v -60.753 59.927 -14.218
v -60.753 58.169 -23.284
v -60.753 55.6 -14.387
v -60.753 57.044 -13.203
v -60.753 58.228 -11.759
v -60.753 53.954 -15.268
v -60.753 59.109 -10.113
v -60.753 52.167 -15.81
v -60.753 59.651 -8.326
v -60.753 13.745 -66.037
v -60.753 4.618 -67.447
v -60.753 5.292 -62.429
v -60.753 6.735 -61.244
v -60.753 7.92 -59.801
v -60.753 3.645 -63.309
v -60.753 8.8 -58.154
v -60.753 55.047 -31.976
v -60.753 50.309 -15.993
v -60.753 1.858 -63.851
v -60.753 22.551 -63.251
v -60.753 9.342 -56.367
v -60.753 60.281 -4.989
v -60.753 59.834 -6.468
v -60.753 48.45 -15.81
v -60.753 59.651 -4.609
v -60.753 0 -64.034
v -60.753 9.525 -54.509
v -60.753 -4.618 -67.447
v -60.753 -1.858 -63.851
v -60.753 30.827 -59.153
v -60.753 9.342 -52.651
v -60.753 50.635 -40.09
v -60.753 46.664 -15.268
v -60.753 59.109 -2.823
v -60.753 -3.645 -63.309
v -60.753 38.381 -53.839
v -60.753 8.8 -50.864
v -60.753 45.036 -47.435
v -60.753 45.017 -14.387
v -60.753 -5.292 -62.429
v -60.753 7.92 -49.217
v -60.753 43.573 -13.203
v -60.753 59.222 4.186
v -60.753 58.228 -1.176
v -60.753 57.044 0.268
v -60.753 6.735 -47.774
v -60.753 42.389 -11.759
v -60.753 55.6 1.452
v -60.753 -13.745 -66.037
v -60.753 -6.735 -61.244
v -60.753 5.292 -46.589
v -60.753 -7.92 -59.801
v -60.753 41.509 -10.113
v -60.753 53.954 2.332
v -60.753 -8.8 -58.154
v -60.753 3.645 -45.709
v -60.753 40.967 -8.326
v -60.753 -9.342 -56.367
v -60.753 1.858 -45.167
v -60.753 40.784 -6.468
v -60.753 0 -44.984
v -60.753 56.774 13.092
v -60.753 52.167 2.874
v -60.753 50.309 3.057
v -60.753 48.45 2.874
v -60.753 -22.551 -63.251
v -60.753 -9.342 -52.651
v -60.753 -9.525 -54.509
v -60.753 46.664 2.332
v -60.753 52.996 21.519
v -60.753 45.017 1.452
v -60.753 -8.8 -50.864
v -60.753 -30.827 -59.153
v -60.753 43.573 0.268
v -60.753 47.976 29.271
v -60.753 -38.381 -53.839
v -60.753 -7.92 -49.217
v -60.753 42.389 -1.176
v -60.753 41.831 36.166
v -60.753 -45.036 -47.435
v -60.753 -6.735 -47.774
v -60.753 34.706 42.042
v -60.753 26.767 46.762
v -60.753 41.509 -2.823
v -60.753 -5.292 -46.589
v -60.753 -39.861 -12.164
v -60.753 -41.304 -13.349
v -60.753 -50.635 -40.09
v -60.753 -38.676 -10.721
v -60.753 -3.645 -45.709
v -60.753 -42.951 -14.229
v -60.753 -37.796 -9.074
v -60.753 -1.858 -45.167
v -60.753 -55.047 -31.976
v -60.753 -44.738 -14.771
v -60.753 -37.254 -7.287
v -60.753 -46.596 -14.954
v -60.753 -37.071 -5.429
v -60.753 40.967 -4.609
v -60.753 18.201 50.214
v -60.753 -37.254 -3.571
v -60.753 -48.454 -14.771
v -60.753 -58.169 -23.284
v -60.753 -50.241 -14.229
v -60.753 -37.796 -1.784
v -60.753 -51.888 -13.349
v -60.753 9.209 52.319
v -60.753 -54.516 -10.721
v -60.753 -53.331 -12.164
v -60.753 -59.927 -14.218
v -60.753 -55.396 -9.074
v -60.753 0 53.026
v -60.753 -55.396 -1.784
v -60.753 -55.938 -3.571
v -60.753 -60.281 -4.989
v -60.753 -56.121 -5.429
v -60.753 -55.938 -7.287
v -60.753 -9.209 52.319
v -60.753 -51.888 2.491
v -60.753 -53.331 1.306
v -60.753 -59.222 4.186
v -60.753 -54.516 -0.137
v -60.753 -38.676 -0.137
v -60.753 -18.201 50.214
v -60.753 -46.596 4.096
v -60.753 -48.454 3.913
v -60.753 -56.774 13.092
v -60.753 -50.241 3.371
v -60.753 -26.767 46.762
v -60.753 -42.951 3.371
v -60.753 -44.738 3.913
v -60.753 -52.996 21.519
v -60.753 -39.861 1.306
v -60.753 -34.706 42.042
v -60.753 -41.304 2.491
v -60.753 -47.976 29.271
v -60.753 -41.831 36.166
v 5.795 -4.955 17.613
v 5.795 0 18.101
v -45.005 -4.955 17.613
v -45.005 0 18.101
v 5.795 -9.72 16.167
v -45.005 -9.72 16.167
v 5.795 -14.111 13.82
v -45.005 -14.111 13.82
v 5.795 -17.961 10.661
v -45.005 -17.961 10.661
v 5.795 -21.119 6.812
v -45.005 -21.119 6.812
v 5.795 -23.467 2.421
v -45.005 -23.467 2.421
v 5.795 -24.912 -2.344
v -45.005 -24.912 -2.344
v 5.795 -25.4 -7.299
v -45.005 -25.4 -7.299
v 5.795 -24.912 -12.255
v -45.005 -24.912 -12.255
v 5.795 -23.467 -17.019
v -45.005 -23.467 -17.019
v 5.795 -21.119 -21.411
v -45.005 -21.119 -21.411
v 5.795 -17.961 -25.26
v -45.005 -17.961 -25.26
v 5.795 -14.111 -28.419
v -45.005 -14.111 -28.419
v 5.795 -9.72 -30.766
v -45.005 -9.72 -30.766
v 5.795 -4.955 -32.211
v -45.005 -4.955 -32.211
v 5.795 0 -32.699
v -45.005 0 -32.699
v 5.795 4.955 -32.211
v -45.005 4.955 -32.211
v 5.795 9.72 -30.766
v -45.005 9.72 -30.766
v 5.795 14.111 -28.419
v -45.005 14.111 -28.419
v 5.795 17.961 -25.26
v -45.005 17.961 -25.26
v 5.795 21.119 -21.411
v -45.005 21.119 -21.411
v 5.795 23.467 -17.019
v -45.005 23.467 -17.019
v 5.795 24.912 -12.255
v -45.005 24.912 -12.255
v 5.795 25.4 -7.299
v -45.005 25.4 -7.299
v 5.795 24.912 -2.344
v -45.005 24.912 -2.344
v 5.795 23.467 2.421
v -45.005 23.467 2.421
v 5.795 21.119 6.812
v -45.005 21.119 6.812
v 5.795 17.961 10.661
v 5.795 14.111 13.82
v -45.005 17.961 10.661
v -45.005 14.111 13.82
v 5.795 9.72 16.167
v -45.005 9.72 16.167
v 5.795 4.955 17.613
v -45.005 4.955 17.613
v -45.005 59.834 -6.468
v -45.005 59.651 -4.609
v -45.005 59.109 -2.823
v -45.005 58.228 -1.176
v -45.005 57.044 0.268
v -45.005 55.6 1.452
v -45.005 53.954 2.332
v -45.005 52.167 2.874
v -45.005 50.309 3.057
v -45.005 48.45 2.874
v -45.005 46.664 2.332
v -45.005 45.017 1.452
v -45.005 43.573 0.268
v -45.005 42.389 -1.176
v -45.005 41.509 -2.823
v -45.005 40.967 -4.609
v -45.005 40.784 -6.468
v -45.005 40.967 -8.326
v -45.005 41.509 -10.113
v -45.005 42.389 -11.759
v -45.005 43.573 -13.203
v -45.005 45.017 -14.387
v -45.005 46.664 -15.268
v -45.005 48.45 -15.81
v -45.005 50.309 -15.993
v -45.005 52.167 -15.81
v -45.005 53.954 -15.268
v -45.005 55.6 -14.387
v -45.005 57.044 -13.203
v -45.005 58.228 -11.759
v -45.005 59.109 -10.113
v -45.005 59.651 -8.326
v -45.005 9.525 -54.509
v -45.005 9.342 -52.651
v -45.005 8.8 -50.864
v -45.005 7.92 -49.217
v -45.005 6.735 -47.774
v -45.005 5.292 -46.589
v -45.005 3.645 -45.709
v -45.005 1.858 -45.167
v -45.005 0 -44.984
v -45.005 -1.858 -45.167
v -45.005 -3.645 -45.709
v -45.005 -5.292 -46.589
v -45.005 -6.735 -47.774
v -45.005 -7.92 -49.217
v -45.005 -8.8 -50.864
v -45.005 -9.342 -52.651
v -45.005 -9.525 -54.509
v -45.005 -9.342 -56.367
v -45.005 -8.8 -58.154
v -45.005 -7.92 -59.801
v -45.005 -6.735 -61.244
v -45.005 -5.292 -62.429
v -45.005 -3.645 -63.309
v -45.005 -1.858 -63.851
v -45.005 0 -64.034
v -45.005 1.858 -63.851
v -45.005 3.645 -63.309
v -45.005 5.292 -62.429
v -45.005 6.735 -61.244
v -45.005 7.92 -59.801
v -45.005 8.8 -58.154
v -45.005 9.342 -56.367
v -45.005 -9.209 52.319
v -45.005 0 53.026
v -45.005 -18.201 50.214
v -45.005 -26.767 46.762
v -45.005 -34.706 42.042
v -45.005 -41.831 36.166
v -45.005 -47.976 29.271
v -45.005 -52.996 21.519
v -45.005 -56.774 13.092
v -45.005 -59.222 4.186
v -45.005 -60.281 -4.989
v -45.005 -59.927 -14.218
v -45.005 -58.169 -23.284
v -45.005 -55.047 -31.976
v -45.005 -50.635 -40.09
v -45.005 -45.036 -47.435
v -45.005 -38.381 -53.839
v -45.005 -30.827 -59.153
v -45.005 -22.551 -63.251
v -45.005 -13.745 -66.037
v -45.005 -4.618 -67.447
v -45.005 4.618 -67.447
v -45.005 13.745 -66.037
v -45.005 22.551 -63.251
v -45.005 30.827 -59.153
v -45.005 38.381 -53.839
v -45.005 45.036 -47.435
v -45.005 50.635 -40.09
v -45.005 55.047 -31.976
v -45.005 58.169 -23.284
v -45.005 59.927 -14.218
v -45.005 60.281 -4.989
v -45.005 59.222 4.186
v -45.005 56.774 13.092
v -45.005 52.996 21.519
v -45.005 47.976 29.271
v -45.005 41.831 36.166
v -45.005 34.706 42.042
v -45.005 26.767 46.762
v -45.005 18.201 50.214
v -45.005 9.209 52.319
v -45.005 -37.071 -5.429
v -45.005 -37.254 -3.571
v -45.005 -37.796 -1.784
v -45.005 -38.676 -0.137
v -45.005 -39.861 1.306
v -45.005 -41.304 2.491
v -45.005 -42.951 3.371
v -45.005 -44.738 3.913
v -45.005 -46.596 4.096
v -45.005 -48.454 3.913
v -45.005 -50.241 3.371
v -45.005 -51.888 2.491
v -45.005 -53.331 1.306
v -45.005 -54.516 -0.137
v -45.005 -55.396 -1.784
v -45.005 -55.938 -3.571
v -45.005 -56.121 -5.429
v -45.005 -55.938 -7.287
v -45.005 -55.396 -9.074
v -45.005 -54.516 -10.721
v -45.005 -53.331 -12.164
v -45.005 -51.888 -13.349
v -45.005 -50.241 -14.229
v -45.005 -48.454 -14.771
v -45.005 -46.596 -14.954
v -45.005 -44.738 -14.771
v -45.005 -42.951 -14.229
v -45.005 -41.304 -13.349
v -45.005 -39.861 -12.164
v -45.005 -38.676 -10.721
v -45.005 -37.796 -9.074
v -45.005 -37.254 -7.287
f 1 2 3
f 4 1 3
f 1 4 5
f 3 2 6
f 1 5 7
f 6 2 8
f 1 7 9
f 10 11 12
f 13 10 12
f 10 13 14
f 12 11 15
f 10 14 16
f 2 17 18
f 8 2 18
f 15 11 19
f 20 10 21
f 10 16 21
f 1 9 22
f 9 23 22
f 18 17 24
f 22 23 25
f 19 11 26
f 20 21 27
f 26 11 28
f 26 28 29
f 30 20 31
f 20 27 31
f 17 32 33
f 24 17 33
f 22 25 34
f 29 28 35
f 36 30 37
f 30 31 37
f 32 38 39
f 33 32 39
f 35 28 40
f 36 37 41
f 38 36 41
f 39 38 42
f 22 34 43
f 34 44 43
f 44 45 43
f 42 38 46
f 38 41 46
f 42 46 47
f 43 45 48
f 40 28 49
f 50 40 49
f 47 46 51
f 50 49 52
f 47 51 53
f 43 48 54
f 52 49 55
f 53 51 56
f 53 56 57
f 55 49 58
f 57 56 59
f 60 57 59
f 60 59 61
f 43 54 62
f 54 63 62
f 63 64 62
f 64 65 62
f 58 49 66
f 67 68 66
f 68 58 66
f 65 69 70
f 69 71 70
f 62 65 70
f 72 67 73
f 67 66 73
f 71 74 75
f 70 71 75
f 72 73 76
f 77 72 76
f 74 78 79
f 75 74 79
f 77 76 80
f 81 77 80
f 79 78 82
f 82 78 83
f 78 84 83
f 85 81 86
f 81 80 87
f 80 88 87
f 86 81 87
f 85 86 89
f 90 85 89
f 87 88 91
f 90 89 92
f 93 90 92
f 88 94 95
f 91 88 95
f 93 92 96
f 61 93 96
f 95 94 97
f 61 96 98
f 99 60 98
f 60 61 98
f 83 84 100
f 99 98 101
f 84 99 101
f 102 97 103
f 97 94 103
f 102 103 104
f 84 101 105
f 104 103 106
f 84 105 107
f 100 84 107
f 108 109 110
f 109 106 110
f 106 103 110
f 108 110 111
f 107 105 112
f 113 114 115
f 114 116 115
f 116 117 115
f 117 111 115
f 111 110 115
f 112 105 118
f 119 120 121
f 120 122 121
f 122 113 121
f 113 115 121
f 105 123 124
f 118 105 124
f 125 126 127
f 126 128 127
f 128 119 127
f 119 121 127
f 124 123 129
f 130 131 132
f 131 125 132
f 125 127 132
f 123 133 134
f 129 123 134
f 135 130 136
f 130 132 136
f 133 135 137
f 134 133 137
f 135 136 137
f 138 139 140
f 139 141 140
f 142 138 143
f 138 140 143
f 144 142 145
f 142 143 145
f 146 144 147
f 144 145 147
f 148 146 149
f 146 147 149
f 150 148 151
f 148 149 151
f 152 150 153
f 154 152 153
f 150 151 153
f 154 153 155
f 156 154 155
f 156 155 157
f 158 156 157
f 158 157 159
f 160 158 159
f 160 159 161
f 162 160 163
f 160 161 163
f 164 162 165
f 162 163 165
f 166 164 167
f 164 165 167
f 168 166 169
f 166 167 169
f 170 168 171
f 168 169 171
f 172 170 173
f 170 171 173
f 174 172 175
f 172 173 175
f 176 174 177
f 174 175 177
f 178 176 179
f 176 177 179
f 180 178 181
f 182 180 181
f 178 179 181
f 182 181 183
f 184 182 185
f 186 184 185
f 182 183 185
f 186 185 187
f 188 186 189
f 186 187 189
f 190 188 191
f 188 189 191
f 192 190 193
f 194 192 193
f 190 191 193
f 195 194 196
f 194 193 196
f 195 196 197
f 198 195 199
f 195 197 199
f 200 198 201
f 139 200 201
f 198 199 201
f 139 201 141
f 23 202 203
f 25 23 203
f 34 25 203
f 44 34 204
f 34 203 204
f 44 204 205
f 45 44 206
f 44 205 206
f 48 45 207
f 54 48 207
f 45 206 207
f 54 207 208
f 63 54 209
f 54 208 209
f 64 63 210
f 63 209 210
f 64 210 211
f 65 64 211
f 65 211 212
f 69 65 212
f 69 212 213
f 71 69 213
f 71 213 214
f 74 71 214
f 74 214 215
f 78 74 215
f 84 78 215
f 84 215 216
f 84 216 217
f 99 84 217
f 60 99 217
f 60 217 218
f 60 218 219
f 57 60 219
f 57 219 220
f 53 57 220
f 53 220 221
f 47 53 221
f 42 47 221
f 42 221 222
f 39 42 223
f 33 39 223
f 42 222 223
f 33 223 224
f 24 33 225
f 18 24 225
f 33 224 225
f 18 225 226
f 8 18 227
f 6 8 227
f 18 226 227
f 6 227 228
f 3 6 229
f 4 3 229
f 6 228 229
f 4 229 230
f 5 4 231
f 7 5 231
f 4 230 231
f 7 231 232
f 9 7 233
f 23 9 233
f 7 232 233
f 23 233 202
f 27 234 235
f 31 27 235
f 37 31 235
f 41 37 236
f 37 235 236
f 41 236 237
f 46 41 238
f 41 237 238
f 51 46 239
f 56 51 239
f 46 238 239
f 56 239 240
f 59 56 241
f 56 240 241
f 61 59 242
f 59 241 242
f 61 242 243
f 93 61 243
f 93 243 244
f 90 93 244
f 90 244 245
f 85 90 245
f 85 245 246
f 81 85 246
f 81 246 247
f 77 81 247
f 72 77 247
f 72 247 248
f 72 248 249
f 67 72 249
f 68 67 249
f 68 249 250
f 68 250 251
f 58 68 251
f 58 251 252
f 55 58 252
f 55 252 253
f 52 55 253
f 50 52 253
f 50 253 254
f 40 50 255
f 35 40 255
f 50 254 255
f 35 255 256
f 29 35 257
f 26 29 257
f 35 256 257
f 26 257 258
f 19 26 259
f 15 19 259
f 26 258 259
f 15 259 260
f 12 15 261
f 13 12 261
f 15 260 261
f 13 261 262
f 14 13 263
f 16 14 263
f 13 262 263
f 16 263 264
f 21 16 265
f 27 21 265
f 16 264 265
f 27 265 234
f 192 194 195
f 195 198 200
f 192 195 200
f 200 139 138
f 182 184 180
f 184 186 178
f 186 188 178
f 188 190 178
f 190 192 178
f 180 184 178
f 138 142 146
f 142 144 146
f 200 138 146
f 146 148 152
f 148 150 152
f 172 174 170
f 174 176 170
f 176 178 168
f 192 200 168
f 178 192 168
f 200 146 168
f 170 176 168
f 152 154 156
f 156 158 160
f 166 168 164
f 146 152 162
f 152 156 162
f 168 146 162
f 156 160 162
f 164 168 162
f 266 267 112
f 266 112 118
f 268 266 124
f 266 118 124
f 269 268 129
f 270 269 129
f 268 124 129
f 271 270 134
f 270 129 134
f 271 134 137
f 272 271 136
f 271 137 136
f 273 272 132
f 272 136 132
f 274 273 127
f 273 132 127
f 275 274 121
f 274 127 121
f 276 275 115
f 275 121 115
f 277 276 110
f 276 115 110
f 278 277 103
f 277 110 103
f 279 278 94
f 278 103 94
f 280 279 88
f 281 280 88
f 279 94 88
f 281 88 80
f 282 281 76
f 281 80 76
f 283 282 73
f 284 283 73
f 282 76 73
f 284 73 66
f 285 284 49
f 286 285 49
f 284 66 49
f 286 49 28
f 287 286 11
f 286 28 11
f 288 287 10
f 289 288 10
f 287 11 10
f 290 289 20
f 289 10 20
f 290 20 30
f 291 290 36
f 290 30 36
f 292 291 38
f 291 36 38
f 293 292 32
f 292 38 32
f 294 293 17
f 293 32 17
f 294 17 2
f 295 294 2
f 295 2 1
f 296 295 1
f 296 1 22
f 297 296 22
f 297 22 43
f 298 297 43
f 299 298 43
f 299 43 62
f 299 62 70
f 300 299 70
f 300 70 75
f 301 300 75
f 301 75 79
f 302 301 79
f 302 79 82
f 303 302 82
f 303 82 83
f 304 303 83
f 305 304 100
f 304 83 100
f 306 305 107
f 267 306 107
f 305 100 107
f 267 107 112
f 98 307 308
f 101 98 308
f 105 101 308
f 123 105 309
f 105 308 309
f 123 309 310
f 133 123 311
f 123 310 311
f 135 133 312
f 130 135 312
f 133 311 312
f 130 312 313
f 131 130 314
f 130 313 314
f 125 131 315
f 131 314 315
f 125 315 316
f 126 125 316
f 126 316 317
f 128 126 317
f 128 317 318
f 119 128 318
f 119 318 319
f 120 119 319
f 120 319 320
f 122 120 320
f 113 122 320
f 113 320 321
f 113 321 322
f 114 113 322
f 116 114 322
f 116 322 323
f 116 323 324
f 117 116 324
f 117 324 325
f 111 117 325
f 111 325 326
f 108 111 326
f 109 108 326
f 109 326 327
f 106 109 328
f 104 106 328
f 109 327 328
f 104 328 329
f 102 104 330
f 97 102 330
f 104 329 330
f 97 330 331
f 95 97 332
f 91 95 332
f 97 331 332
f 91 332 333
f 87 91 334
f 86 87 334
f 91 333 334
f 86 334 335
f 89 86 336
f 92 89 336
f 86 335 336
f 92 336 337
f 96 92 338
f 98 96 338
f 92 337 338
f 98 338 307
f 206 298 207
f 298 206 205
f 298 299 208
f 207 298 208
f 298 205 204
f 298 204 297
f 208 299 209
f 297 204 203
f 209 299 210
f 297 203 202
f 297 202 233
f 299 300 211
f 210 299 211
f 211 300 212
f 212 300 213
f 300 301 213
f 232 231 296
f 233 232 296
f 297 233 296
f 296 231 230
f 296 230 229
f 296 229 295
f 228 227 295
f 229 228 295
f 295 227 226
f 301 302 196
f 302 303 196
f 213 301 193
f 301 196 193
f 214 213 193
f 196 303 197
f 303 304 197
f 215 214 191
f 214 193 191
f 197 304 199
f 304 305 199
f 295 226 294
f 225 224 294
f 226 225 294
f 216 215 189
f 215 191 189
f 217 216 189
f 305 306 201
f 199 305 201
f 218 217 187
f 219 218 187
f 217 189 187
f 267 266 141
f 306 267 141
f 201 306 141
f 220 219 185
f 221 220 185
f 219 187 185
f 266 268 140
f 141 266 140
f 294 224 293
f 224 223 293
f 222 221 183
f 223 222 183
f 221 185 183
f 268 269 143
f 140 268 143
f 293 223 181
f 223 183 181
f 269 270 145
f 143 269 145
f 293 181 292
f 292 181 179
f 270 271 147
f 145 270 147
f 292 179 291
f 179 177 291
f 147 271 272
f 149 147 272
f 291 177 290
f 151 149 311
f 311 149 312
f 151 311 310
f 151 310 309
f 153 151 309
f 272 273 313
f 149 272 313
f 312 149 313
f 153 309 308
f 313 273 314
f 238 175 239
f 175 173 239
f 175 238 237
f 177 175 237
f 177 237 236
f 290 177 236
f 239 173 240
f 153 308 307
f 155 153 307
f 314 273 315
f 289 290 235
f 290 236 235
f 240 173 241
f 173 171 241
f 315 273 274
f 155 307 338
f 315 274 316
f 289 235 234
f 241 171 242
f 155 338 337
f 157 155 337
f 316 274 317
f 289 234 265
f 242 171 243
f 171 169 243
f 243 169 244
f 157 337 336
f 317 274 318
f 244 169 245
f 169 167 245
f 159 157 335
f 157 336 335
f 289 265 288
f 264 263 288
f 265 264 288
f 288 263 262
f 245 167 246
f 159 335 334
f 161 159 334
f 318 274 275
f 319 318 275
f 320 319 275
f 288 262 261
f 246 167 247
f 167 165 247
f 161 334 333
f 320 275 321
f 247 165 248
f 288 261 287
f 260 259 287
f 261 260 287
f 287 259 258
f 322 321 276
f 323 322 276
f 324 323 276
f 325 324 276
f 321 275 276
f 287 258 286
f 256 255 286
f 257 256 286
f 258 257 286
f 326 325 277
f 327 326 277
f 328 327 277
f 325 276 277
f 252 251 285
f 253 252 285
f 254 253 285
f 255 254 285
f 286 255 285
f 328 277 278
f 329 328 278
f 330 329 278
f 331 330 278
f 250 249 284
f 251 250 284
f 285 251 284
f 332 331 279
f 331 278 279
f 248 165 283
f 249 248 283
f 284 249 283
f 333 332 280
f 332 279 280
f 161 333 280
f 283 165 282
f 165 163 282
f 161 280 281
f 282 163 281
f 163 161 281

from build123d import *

# Parameters (mm, degrees)
F2_R     = 9.525
F3_DEPTH = 508.508
F4_R     = 9.525
F5_DEPTH = 25.4
F6_R     = 9.525
F7_DEPTH = 25.4


with BuildPart() as f1:
    # F0 (on Front) → F1 (revolve)
    with BuildSketch(Plane.XZ):
        Polygon((-45.004993, 53.025745), (-60.752993, 53.025745), (-60.752993, -7.299255), (5.795007, -7.299255), (5.795007, 18.100745), (-45.004993, 18.100745), align=None)
    revolve(axis=Axis((-27.478993, 0, -7.299255), (1, 0, 0)))

    # F2 (on face) → F3 (cut)
    with BuildSketch(Plane.YZ.offset(-45.004993)):
        with Locations((50.308675, -6.467566)):
            Circle(F2_R)
    extrude(amount=-F3_DEPTH, mode=Mode.SUBTRACT)

    # F4 (on face) → F5 (cut)
    with BuildSketch(Plane.YZ.offset(-45.004993)):
        with Locations((-46.595834, -5.428873)):
            Circle(F4_R)
    extrude(amount=-F5_DEPTH, mode=Mode.SUBTRACT)

    # F6 (on face) → F7 (cut)
    with BuildSketch(Plane.YZ.offset(-45.004993)):
        with Locations((0, -54.508783)):
            Circle(F6_R)
    extrude(amount=-F7_DEPTH, mode=Mode.SUBTRACT)


solid = f1.part
